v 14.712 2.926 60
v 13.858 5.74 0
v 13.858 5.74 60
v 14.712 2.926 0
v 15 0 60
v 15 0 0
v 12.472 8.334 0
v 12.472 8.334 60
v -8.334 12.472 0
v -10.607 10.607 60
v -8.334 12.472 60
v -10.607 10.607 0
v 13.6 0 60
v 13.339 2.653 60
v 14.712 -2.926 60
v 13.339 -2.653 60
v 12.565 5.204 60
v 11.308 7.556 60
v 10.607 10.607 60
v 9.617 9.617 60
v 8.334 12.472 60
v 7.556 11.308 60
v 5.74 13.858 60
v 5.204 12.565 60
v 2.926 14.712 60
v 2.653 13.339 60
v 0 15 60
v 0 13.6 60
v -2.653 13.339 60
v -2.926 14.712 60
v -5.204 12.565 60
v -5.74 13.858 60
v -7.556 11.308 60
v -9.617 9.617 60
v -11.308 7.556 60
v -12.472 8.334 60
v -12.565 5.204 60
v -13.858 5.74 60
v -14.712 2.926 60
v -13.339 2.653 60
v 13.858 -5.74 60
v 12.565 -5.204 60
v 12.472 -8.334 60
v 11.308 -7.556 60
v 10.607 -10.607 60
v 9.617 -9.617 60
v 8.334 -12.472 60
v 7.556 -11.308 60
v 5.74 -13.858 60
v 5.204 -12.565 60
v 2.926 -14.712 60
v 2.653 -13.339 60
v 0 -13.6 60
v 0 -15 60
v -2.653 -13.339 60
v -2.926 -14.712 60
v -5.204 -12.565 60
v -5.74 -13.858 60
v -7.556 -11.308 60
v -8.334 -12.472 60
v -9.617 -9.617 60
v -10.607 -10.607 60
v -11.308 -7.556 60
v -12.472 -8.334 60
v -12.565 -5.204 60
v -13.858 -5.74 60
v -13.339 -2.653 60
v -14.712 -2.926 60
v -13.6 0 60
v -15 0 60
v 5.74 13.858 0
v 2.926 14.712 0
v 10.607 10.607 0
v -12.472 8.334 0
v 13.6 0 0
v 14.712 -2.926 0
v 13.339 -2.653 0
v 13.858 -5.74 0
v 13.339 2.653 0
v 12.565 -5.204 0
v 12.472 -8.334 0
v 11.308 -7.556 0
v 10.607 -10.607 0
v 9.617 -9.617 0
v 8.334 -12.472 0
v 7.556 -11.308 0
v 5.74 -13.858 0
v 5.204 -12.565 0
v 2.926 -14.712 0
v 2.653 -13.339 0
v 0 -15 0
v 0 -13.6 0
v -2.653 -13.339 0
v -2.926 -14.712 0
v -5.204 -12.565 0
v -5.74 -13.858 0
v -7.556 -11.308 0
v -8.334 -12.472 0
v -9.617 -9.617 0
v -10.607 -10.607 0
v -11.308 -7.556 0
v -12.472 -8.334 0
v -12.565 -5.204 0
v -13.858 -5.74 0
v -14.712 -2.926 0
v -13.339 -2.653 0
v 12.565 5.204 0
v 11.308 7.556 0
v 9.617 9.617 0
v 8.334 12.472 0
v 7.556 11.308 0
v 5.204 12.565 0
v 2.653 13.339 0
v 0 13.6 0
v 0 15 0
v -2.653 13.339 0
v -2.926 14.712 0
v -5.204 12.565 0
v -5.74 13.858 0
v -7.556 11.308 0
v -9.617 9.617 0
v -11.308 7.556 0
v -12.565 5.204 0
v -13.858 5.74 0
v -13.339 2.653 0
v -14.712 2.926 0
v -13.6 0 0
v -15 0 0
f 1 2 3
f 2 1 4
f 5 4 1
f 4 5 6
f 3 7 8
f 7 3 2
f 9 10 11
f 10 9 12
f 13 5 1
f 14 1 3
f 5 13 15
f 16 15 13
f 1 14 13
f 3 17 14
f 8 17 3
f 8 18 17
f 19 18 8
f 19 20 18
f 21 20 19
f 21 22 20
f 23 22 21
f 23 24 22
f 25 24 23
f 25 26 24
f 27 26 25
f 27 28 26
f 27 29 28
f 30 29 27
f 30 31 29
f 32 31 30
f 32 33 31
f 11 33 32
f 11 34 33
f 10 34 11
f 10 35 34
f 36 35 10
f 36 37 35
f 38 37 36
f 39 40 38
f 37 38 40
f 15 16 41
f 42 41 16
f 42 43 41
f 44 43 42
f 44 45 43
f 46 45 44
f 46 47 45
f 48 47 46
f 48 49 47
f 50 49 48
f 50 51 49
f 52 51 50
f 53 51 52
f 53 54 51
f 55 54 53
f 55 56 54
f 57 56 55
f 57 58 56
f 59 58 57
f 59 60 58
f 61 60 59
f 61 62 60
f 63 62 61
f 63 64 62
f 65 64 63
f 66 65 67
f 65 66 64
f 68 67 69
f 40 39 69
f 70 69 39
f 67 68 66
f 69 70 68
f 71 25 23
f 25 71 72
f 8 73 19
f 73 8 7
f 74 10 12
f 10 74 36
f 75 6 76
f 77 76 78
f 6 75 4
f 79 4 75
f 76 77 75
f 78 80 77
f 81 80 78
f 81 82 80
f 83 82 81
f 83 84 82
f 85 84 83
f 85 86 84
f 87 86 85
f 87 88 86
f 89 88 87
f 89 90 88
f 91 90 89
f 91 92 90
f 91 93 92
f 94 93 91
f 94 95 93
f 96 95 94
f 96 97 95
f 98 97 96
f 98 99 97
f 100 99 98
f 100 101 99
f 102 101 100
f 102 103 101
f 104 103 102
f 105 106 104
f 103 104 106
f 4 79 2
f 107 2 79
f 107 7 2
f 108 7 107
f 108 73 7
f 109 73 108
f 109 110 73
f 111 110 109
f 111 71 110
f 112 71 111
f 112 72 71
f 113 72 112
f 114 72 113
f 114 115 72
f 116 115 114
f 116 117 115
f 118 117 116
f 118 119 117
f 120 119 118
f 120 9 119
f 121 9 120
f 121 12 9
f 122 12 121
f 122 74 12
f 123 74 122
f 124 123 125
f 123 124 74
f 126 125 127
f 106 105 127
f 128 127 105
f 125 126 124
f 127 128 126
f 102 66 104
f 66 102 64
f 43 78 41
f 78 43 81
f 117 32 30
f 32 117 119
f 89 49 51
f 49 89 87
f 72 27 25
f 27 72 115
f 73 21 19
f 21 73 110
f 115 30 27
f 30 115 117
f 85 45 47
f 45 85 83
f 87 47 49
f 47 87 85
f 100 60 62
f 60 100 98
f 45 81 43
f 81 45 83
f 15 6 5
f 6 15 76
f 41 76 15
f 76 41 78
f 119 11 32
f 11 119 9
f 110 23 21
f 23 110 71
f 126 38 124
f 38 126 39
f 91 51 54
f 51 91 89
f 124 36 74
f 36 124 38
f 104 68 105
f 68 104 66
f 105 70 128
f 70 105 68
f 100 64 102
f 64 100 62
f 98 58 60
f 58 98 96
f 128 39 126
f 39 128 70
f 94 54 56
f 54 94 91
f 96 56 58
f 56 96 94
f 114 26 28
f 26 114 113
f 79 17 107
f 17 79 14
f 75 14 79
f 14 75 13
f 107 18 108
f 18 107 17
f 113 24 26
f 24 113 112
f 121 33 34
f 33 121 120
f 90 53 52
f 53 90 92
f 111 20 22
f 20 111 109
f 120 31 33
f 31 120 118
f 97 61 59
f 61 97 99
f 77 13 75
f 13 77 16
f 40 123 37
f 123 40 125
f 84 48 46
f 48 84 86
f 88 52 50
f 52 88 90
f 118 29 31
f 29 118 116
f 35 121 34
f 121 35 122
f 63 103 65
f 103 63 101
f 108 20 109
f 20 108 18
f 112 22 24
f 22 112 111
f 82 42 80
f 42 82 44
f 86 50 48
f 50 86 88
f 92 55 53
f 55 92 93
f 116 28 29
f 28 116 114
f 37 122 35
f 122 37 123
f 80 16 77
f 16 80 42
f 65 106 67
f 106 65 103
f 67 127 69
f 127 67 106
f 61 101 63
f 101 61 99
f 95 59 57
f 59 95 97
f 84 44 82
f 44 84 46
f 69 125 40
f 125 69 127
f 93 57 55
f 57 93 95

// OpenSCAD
$fn = 32;

// ----------------------------------------------------------------------
// Thin tube: 1.4 mm wall
// ----------------------------------------------------------------------

// --- parameters (mm) ---
tube_od = 30;             // outer diameter
tube_h = 60;              // height, Z
wall = 1.4;               // wall thickness
fit_tol = 0.1;            // tolerance for press fits, mm
free_tol = 0.3;           // tolerance for clearance fits, mm

difference() {
  cylinder(h = tube_h, d = tube_od);
  translate([0, 0, -1]) cylinder(h = tube_h + 2, d = tube_od - 2 * wall);
}
